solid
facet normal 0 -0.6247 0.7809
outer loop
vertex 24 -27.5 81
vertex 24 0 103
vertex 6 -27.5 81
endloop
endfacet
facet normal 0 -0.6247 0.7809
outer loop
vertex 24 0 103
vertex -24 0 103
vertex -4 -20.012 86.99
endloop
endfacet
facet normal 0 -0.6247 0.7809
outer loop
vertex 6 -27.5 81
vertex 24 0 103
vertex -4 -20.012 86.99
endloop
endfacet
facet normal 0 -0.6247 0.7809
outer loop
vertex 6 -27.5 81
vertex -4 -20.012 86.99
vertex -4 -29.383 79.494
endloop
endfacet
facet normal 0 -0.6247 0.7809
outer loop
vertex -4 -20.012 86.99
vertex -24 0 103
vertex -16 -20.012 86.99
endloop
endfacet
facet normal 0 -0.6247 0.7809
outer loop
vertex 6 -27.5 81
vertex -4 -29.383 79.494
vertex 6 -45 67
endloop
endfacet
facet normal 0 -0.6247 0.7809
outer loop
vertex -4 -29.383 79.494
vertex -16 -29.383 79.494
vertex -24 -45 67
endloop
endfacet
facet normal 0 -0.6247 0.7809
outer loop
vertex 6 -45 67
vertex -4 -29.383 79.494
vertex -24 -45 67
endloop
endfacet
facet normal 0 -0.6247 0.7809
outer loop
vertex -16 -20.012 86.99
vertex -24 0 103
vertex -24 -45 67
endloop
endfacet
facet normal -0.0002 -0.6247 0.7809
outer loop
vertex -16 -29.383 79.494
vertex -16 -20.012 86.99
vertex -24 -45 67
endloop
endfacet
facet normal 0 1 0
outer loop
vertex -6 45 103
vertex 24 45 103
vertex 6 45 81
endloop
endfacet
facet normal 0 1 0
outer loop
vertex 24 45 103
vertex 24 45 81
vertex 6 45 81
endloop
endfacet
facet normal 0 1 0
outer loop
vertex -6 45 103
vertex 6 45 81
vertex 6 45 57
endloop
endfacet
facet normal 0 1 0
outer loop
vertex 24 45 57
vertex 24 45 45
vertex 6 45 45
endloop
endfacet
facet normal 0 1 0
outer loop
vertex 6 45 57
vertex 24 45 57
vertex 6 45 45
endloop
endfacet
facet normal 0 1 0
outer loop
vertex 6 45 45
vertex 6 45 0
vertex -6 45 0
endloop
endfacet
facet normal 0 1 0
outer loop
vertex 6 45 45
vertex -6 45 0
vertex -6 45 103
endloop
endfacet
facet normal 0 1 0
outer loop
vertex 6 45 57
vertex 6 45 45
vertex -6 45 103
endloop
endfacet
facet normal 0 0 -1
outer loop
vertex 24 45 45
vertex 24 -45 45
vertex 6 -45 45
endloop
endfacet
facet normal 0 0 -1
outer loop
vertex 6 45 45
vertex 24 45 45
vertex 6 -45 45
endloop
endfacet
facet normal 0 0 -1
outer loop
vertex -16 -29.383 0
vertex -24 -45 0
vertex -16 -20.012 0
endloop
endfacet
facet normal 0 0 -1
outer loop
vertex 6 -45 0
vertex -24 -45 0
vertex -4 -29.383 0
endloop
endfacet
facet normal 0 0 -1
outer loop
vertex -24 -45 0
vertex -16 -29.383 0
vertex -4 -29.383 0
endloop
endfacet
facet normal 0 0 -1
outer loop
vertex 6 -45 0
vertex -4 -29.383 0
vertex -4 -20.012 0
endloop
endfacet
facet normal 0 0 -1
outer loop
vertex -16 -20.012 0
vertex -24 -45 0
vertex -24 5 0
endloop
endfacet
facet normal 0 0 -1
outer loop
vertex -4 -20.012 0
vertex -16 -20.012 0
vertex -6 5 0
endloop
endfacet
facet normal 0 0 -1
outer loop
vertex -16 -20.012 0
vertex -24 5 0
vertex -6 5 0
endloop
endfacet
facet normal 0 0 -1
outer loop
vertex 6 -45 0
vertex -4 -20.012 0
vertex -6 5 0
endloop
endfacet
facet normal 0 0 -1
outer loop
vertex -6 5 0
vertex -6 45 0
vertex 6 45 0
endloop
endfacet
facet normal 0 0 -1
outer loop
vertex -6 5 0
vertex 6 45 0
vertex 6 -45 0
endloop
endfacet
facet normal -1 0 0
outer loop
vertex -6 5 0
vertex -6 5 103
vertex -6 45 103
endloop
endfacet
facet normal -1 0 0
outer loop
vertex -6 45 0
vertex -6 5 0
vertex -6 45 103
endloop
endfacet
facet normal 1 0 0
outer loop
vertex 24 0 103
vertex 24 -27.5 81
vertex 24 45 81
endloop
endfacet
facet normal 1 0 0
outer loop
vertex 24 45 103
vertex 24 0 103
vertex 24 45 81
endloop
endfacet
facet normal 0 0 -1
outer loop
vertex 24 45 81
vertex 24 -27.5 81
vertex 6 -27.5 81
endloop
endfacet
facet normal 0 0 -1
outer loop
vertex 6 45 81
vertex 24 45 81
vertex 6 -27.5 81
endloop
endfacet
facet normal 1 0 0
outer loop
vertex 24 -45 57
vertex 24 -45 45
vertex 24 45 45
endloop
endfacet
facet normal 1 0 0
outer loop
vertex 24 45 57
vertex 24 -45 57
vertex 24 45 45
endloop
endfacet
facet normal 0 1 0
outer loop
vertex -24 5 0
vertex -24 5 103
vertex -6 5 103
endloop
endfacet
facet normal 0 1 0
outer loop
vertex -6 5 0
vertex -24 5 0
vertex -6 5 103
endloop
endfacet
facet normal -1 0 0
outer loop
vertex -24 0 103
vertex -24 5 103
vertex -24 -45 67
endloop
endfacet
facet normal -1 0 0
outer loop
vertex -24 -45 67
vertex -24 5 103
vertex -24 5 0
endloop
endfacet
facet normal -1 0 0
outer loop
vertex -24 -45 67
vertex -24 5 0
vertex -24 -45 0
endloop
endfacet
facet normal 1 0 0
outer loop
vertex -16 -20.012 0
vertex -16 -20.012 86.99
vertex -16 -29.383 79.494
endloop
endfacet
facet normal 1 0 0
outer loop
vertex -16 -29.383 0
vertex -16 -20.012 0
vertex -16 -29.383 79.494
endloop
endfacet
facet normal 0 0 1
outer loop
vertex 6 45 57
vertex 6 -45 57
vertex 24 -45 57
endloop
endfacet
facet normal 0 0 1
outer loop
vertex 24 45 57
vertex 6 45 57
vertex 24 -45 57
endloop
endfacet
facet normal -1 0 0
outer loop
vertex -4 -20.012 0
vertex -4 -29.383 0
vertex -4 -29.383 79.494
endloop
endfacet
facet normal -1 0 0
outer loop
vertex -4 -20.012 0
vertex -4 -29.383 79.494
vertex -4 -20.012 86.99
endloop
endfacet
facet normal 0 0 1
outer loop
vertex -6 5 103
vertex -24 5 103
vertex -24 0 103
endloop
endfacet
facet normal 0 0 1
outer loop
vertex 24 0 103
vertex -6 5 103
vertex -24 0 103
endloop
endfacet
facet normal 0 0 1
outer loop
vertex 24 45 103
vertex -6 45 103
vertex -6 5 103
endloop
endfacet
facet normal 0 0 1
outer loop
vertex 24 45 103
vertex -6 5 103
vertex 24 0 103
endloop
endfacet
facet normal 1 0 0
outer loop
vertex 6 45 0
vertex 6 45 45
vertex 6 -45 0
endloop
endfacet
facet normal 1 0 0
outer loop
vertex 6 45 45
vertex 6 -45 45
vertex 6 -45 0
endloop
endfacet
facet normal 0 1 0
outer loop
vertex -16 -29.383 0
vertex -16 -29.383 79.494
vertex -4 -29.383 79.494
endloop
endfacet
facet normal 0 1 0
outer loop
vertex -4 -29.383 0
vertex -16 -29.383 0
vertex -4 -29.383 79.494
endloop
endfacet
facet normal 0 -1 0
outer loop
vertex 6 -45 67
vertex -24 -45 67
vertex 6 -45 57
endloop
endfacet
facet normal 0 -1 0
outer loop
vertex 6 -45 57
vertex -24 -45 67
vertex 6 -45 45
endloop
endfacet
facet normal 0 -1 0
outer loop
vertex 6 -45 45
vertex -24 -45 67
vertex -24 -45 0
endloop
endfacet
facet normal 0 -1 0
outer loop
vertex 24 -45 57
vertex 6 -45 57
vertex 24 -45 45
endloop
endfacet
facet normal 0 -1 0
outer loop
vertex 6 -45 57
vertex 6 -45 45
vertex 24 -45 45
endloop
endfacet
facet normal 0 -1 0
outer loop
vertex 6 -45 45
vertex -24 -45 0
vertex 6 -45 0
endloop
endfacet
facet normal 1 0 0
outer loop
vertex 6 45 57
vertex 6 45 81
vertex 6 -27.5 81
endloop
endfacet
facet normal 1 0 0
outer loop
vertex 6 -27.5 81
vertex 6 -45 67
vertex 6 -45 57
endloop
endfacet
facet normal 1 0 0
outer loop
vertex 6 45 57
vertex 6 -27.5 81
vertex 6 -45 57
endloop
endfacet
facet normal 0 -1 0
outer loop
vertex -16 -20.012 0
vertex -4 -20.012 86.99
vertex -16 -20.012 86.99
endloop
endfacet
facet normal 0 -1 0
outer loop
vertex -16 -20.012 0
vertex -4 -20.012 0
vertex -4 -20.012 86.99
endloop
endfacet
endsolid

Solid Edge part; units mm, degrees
sketch "Sketch1" plane through (0, 0, 0) normal (0, 0, 1) x (1, 0, 0)
  line L0 (24, -45) -> (24, 45)
  line L1 (24, 45) -> (-24, 45)
  line L2 (-24, 45) -> (-24, -45)
  line L3 (-24, -45) -> (24, -45)
extrude "Protrusion1" add sketch "Sketch1" along normal blind 103
sketch "Sketch2" plane through (0, -45, 51.5) normal (0, -1, 0) x (1, 0, 0)
  line L0 (6, 5.5) -> (24, 5.5)
  line L1 (24, 5.5) -> (24, 29.5)
  line L2 (24, 29.5) -> (6, 29.5)
  line L3 (6, 29.5) -> (6, 5.5)
  line L4 (24, -6.5) -> (6, -6.5)
  line L5 (6, -6.5) -> (6, -51.5)
  line L6 (6, -51.5) -> (24, -51.5)
  line L7 (24, -51.5) -> (24, -6.5)
extrude "Cutout1" cut sketch "Sketch2" against normal up to next
sketch "Sketch3" plane through (0, 0, 103) normal (0, 0, 1) x (1, 0, 0)
  line L0 (-24, 5) -> (-6, 5)
  line L1 (-6, 5) -> (-6, 45)
  line L2 (-6, 45) -> (-24, 45)
  line L3 (-24, 45) -> (-24, 5)
extrude "Cutout2" cut sketch "Sketch3" against normal up to next
sketch "Sketch4" plane through (-24, -20, 51.5) normal (-1, 0, 0) x (0, -1, 0)
  line L0 (-20, 51.5) -> (25, 15.5)
extrude "Cutout3" cut sketch "Sketch4" against normal up to next material side at (-24, -22.5312, 85.039)
sketch "Sketch5" plane through (0, 0, 0) normal (0, 0, 1) x (1, 0, 0)
  line L0 (-4, -29.3826) -> (-4, -20.0122)
  line L1 (-4, -20.0122) -> (-16, -20.0122)
  line L2 (-16, -20.0122) -> (-16, -29.3826)
  line L3 (-16, -29.3826) -> (-4, -29.3826)
extrude "Cutout4" cut sketch "Sketch5" along normal up to next
